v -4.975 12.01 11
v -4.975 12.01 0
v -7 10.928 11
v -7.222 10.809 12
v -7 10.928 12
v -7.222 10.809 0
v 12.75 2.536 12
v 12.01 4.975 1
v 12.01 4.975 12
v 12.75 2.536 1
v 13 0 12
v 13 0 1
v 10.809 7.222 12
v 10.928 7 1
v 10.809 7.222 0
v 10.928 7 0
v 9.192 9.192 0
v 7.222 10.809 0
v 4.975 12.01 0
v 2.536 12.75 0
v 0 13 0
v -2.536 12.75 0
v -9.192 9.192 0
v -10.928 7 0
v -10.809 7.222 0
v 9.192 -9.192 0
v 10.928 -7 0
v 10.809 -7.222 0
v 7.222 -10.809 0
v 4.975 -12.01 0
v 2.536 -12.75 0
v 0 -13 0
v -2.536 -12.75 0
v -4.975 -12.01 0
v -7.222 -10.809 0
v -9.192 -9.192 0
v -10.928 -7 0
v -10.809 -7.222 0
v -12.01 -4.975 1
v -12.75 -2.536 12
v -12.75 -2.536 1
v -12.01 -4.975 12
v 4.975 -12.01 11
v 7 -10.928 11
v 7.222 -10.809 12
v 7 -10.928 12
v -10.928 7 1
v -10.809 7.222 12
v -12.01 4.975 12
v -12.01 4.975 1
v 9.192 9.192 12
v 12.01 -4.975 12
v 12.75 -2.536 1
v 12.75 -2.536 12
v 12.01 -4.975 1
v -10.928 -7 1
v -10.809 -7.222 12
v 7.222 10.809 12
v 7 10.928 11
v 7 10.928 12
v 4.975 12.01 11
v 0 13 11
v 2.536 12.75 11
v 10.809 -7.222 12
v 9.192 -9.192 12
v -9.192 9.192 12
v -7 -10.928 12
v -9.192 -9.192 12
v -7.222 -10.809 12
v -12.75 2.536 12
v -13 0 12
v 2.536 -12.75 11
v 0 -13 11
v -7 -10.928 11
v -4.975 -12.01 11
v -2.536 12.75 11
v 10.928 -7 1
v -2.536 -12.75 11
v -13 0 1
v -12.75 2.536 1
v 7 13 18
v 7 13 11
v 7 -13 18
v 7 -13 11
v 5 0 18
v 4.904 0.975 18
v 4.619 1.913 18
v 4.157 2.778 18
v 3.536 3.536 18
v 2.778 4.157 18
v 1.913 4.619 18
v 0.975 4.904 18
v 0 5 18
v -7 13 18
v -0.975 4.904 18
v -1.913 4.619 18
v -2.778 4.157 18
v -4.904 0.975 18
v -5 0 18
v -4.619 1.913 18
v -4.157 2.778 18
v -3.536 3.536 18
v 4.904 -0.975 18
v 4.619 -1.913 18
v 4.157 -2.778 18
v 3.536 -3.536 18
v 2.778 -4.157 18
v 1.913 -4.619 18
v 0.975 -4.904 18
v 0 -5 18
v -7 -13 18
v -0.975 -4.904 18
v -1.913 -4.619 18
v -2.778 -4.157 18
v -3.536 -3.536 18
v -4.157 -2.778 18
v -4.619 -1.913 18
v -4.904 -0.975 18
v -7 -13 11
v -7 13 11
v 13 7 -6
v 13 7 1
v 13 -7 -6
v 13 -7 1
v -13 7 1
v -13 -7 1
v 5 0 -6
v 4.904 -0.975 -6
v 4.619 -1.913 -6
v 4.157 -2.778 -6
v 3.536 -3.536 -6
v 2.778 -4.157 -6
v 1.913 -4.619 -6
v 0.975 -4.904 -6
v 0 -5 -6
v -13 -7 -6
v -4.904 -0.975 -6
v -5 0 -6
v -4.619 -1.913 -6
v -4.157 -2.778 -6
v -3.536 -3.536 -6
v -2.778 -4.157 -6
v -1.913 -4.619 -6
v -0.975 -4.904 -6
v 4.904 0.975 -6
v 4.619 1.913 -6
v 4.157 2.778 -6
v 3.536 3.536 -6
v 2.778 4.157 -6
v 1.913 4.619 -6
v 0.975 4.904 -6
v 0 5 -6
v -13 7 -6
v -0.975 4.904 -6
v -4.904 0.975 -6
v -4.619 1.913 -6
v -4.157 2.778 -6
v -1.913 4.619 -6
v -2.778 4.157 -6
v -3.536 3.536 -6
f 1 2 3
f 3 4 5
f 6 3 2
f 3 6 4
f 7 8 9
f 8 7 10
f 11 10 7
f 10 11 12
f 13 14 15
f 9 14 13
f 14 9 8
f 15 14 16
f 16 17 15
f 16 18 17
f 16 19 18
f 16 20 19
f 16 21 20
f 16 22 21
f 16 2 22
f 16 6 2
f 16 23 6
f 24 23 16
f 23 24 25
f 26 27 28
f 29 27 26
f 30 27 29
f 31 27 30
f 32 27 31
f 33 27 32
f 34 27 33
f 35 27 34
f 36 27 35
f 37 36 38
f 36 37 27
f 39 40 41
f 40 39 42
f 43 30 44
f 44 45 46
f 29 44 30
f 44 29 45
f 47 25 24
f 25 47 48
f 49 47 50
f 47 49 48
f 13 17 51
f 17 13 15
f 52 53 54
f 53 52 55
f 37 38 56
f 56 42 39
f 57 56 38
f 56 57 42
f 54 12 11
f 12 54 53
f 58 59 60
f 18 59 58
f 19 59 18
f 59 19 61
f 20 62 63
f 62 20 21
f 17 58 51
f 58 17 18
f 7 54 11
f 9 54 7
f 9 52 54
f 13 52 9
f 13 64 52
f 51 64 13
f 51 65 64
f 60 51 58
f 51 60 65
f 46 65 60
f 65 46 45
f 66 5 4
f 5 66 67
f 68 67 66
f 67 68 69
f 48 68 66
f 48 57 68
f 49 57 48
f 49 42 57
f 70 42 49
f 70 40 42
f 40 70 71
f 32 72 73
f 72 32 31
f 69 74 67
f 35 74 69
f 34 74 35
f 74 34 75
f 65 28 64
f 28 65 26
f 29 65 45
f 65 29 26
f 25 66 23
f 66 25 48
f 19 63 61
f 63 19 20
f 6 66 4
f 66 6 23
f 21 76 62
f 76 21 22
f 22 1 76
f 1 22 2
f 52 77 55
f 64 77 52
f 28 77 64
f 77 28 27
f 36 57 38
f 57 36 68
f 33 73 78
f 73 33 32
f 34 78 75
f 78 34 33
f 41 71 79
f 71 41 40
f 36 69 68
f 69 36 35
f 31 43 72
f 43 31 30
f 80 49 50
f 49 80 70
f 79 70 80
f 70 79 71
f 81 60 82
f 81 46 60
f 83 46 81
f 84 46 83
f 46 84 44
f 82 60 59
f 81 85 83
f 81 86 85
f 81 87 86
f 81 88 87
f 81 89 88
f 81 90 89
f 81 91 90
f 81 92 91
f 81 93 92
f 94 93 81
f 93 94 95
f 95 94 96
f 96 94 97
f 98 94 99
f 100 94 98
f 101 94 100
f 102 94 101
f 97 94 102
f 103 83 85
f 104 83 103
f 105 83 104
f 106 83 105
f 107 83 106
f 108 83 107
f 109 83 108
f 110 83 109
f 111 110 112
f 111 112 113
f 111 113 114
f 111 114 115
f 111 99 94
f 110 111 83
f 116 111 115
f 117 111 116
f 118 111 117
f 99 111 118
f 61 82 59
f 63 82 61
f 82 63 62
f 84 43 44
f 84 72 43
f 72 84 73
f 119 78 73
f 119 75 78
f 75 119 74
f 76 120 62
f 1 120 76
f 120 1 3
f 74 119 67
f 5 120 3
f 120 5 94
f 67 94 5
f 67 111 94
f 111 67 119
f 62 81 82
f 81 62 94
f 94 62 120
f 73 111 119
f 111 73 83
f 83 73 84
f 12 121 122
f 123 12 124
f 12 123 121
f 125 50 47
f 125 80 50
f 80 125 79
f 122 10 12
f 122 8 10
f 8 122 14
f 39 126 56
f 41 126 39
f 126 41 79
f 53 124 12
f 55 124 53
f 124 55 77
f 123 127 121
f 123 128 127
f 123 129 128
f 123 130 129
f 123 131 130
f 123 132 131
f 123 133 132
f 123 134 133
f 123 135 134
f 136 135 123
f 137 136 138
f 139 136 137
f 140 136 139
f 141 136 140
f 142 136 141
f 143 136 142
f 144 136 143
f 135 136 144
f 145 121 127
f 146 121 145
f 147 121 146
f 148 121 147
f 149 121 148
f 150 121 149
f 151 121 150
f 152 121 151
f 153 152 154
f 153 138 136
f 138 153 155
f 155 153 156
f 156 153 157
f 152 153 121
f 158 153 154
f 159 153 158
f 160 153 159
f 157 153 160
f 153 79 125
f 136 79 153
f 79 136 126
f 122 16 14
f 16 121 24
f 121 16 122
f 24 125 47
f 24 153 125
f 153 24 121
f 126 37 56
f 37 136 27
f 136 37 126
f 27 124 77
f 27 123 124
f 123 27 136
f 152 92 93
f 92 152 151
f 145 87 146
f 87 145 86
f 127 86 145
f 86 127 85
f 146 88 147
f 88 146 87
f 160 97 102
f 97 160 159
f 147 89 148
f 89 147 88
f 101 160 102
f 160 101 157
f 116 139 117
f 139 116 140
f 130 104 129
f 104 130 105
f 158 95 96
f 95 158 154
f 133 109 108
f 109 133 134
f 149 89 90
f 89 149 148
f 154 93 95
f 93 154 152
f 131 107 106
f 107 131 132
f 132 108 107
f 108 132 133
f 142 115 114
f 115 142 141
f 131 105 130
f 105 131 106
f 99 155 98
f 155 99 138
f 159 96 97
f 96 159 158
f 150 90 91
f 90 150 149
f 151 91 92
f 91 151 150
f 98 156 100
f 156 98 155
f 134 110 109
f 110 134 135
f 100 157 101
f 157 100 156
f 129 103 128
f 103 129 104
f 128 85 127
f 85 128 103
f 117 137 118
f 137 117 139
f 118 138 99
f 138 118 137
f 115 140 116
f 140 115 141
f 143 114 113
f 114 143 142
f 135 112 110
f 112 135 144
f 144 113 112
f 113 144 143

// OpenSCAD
$fn = 32;

// ----------------------------------------------------------------------
// Oldham coupling disc: 26 x 24 mm
// ----------------------------------------------------------------------

// --- parameters (mm) ---
disc_d = 26;              // disc diameter
disc_t = 12;              // disc thickness
tongue_w = 14;            // tongue width
tongue_h = 6;             // tongue height
bore_d = 10;              // centre lightening bore

module disc() {
  cylinder(h = disc_t, d = disc_d);
  /* tongue on the top face, sunk 1 mm into the disc */
  translate([-tongue_w / 2, -disc_d / 2, disc_t - 1]) cube([tongue_w, disc_d, tongue_h + 1]);
  /* slot wall on the bottom face, 90 degrees turned */
  translate([-disc_d / 2, -tongue_w / 2, -tongue_h]) cube([disc_d, tongue_w, tongue_h + 1]);
}

difference() {
  disc();
  translate([0, 0, -tongue_h - 1]) cylinder(h = disc_t + 2 * tongue_h + 2, d = bore_d);
}
